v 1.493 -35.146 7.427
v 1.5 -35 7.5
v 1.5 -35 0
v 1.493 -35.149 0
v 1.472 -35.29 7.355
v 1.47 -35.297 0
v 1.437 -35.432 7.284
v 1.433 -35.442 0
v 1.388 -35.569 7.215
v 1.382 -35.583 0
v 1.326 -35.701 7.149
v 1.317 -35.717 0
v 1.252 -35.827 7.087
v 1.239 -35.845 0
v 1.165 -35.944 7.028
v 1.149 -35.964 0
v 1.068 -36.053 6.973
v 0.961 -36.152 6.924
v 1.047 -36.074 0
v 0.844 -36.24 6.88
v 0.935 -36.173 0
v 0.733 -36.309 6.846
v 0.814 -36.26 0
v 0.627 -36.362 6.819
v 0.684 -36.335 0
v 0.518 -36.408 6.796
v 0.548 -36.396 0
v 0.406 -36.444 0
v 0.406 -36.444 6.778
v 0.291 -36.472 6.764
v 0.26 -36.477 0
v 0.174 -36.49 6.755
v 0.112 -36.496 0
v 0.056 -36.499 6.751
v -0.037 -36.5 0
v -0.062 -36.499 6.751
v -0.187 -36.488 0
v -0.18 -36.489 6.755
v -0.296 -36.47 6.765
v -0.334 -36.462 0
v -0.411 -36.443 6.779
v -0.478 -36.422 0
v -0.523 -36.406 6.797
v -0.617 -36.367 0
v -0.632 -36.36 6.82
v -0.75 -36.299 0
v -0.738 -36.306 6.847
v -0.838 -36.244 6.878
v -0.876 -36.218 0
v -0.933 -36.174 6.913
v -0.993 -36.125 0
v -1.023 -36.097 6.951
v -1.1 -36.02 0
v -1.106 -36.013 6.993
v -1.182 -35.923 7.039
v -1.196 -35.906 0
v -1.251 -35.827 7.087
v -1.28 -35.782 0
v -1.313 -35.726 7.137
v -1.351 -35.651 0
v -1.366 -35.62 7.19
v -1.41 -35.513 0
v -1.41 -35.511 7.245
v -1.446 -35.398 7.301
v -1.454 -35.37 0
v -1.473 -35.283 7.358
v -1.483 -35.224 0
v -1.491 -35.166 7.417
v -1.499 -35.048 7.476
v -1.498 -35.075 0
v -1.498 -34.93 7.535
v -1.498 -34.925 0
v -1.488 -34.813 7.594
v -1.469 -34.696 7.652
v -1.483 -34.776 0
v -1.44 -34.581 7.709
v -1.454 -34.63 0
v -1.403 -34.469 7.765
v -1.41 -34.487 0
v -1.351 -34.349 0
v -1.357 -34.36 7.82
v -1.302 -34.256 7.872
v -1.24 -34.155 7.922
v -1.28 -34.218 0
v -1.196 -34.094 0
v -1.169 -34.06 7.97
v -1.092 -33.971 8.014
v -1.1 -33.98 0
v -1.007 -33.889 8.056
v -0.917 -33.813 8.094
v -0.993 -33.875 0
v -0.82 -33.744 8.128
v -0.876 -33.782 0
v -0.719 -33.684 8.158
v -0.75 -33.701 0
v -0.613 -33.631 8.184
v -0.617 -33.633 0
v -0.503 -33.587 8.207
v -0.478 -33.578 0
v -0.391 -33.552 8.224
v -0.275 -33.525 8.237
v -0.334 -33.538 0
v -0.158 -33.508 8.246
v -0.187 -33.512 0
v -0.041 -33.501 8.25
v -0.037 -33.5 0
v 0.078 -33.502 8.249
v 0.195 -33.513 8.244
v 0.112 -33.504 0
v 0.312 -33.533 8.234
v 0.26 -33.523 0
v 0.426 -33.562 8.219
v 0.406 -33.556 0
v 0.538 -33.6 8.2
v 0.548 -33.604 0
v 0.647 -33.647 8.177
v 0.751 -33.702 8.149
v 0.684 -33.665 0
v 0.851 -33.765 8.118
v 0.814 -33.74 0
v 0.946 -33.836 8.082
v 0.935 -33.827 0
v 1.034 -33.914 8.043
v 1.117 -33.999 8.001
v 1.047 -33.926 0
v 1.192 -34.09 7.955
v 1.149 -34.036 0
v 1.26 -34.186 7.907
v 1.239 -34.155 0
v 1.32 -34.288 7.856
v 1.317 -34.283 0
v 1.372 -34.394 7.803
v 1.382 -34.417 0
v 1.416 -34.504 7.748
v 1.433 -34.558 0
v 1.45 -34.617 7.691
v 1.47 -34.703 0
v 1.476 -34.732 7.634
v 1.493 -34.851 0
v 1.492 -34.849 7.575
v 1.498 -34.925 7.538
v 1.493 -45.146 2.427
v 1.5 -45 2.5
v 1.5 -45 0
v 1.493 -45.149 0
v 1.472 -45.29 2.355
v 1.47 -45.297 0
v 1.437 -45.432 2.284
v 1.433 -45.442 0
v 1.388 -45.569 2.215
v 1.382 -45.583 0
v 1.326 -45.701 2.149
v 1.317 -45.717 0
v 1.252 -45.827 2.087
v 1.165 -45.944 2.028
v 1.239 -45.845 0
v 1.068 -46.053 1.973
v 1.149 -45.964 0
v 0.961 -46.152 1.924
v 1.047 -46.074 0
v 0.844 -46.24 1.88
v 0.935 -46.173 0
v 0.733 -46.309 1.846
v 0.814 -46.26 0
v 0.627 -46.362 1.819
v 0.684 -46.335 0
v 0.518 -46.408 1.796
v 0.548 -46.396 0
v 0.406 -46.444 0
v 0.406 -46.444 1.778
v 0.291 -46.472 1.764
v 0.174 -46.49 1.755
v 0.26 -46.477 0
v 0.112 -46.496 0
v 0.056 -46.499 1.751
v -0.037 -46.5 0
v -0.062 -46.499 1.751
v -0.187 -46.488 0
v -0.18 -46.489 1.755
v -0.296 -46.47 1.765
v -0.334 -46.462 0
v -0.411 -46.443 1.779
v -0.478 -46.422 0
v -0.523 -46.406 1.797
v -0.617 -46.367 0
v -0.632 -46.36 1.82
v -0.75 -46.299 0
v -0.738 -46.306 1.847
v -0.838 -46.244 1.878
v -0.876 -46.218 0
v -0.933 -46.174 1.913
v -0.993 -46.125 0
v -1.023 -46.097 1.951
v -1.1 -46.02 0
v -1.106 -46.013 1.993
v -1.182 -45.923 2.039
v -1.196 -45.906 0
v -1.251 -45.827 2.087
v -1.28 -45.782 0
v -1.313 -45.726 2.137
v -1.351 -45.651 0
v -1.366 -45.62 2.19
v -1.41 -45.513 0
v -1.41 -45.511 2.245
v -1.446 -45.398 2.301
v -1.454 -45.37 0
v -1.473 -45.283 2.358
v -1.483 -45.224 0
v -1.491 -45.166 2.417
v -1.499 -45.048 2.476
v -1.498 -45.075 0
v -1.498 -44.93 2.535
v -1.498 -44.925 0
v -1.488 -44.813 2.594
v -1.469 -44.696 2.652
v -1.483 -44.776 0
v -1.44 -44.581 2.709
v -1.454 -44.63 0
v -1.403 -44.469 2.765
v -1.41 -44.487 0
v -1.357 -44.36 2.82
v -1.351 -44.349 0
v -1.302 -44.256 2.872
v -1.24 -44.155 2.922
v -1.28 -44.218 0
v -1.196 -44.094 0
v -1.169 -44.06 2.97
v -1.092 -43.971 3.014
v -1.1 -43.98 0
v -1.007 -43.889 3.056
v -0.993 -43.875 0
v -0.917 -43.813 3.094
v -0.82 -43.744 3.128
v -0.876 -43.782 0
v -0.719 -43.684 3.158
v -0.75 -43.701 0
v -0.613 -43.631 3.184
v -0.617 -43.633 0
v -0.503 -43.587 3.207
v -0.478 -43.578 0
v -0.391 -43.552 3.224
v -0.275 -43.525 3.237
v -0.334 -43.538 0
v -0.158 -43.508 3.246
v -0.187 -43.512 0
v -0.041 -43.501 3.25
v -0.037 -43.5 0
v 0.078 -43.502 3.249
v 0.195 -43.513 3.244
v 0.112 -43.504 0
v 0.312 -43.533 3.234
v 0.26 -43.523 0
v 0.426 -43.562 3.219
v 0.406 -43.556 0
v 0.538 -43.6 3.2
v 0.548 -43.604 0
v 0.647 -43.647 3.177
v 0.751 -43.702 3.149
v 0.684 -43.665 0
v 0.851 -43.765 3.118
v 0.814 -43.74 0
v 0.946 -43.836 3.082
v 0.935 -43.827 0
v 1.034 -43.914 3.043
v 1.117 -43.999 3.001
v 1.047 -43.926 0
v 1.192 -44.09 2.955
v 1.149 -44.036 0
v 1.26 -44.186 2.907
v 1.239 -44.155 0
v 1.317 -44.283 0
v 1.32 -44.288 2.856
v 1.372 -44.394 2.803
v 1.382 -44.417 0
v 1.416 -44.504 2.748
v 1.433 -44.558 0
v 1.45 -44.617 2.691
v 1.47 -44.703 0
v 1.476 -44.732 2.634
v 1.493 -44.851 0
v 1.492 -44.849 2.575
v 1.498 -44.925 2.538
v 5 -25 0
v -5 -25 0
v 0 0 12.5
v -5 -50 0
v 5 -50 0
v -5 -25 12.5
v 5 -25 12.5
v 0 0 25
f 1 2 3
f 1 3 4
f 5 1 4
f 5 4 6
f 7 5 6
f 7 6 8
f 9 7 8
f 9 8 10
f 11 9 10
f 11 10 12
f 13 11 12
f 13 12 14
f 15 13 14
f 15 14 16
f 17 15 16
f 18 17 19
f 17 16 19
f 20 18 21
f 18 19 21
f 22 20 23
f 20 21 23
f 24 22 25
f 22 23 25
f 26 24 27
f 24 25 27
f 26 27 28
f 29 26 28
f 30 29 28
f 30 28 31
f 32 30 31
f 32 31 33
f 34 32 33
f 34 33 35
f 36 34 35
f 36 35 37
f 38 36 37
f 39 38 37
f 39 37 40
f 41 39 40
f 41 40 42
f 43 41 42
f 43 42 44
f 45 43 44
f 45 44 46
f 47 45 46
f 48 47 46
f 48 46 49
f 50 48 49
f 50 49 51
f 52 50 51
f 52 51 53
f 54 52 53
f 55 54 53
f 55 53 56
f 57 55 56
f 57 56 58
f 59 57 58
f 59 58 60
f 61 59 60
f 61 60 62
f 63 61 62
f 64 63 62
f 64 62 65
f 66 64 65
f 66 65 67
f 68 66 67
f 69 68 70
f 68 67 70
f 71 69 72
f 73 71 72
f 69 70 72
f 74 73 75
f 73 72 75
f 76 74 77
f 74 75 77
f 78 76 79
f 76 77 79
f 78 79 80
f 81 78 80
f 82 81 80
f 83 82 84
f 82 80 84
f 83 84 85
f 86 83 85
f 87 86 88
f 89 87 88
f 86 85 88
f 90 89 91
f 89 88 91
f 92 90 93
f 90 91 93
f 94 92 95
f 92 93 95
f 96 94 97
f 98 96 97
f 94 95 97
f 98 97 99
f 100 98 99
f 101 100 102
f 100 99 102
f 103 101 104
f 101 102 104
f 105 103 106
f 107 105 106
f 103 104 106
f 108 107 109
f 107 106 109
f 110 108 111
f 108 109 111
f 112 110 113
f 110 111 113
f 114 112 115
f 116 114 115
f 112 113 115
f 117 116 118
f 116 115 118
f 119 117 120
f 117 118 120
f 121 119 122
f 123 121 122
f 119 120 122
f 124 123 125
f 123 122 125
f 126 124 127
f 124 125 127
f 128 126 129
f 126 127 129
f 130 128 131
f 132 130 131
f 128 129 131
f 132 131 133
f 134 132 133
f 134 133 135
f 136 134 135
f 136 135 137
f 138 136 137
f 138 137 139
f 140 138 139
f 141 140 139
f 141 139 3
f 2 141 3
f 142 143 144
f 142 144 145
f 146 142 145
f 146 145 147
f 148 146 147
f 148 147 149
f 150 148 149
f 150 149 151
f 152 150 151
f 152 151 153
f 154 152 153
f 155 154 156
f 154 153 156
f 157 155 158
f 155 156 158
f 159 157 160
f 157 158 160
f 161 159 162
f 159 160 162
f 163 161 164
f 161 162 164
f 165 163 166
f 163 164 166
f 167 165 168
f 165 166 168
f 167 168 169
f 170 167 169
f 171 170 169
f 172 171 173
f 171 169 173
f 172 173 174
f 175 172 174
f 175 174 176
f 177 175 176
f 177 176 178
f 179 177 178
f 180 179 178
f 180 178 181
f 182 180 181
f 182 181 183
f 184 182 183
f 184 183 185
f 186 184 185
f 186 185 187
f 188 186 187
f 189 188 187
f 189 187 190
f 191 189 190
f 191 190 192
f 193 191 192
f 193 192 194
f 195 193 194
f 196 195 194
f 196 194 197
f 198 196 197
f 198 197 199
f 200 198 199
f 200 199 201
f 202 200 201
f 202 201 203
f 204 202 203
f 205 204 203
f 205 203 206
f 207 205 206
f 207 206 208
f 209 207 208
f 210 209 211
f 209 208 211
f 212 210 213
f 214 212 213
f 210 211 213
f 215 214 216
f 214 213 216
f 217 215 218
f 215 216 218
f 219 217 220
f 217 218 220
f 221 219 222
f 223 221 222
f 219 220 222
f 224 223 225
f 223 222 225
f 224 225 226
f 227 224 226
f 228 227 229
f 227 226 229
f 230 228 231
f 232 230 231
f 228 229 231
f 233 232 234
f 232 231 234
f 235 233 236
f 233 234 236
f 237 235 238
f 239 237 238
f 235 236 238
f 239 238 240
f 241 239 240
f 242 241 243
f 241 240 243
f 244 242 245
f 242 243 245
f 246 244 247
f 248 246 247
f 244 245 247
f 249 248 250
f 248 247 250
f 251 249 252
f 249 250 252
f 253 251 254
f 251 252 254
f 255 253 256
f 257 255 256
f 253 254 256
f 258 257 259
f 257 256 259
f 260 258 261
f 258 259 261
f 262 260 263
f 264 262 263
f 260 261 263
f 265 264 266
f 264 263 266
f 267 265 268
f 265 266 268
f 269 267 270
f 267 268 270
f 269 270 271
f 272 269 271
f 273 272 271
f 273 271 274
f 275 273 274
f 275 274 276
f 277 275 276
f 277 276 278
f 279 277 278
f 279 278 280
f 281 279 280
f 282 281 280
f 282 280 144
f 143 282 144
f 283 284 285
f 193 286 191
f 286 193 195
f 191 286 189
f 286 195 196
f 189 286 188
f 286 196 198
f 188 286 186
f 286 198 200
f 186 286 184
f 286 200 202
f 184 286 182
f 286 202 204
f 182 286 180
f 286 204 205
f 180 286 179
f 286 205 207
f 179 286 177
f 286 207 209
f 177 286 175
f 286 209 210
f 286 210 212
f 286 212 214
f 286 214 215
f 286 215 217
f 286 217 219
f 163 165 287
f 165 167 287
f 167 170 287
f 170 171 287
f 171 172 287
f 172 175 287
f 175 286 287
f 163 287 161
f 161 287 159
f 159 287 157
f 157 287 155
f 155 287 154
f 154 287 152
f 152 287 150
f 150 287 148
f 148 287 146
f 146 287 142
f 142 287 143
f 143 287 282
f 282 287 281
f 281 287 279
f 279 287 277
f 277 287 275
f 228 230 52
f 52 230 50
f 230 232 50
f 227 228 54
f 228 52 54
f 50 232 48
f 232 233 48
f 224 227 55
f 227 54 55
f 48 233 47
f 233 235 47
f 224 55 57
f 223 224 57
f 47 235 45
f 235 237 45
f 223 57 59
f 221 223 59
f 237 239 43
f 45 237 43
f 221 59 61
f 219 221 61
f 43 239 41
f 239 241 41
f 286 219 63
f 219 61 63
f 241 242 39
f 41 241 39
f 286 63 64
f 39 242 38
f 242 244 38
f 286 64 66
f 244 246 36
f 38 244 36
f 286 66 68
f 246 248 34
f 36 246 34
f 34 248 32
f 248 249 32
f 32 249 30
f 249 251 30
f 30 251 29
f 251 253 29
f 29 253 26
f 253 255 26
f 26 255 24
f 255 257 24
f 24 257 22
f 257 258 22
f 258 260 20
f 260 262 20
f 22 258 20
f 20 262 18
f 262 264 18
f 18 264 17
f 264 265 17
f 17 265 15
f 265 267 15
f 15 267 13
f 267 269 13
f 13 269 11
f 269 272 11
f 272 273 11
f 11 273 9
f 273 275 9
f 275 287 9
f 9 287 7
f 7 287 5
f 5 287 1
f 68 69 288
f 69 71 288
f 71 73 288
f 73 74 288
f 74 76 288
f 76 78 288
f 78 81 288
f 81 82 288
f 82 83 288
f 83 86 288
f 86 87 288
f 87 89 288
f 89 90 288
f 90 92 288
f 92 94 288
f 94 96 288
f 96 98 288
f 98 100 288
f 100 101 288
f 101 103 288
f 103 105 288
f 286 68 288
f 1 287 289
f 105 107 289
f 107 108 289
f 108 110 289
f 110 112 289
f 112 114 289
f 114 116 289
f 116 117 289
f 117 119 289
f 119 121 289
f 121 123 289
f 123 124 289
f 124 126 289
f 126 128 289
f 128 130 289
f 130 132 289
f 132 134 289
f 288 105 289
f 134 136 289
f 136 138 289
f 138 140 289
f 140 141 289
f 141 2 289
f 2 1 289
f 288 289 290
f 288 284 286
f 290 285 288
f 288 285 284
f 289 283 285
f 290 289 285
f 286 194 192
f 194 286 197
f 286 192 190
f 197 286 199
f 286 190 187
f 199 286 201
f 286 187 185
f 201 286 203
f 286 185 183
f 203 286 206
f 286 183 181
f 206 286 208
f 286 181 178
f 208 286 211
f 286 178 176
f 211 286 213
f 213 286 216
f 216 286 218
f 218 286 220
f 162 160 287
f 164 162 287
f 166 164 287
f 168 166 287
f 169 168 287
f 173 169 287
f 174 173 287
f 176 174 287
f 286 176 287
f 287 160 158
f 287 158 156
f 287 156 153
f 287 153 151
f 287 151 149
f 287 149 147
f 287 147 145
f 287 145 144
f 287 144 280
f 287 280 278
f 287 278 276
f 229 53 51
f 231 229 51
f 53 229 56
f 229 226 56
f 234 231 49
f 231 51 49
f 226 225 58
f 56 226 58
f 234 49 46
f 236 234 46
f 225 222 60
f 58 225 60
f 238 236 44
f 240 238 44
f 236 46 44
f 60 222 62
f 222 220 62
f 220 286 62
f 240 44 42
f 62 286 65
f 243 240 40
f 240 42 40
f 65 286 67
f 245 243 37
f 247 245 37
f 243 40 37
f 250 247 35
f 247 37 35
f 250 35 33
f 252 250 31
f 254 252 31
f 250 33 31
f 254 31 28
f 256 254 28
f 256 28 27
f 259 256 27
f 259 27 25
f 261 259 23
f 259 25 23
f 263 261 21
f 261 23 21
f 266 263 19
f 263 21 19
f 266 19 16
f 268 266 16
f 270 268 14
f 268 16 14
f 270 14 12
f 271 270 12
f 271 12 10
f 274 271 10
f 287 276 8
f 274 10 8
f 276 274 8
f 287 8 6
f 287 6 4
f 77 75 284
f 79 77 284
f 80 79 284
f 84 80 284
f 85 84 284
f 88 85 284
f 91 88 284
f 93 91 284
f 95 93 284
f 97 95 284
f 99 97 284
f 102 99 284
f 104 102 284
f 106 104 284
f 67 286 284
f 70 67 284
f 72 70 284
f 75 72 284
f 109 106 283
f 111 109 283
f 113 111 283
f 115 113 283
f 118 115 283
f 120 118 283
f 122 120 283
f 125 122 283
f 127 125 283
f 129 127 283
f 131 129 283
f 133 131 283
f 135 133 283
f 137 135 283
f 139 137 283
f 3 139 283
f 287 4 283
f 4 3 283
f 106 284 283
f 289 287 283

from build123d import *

# Parameters (mm, degrees)
F1_DEPTH = 25
F3_DEPTH = 5.001
F4_DEPTH = 5.001
F5_R     = 1.5
F6_DEPTH = 25.001


with BuildPart() as f1:
    # F0 (on Top) → F1 (new body)
    with BuildSketch(Plane.XY):
        Polygon((-5, -25), (-5, -50), (5, -50), (5, -25), (0, 0), align=None)
    extrude(amount=F1_DEPTH)

    # F2 (on Right) → F3 (cut, through all)
    with BuildSketch(Plane.YZ):
        Polygon((-50, 0), (0, 25), (-50, 25), align=None)
        Polygon((-25, 0), (0, 0), (0, 12.5), align=None)
    extrude(amount=-F3_DEPTH, mode=Mode.SUBTRACT)

    # F3_face (on face) → F4 (cut, through all)
    with BuildSketch(Plane(origin=(0, -33.333333, 16.666667), x_dir=(0, 1, 0), z_dir=(-1, 0, 0))):
        Polygon((33.333333, -8.333333), (-16.666667, 16.666667), (-16.666667, -8.333333), align=None)
        Polygon((33.333333, 16.666667), (8.333333, 16.666667), (33.333333, 4.166667), align=None)
    extrude(amount=-F4_DEPTH, mode=Mode.SUBTRACT)

    # F5 (on face) → F6 (cut, through all)
    with BuildSketch(Plane(origin=(0, 0, 0), x_dir=(1, 0, 0), z_dir=(0, 0, -1))):
        with Locations((0, 35)):
            Circle(F5_R)
        with Locations((0, 45)):
            Circle(F5_R)
    extrude(amount=-F6_DEPTH, mode=Mode.SUBTRACT)


solid = f1.part
